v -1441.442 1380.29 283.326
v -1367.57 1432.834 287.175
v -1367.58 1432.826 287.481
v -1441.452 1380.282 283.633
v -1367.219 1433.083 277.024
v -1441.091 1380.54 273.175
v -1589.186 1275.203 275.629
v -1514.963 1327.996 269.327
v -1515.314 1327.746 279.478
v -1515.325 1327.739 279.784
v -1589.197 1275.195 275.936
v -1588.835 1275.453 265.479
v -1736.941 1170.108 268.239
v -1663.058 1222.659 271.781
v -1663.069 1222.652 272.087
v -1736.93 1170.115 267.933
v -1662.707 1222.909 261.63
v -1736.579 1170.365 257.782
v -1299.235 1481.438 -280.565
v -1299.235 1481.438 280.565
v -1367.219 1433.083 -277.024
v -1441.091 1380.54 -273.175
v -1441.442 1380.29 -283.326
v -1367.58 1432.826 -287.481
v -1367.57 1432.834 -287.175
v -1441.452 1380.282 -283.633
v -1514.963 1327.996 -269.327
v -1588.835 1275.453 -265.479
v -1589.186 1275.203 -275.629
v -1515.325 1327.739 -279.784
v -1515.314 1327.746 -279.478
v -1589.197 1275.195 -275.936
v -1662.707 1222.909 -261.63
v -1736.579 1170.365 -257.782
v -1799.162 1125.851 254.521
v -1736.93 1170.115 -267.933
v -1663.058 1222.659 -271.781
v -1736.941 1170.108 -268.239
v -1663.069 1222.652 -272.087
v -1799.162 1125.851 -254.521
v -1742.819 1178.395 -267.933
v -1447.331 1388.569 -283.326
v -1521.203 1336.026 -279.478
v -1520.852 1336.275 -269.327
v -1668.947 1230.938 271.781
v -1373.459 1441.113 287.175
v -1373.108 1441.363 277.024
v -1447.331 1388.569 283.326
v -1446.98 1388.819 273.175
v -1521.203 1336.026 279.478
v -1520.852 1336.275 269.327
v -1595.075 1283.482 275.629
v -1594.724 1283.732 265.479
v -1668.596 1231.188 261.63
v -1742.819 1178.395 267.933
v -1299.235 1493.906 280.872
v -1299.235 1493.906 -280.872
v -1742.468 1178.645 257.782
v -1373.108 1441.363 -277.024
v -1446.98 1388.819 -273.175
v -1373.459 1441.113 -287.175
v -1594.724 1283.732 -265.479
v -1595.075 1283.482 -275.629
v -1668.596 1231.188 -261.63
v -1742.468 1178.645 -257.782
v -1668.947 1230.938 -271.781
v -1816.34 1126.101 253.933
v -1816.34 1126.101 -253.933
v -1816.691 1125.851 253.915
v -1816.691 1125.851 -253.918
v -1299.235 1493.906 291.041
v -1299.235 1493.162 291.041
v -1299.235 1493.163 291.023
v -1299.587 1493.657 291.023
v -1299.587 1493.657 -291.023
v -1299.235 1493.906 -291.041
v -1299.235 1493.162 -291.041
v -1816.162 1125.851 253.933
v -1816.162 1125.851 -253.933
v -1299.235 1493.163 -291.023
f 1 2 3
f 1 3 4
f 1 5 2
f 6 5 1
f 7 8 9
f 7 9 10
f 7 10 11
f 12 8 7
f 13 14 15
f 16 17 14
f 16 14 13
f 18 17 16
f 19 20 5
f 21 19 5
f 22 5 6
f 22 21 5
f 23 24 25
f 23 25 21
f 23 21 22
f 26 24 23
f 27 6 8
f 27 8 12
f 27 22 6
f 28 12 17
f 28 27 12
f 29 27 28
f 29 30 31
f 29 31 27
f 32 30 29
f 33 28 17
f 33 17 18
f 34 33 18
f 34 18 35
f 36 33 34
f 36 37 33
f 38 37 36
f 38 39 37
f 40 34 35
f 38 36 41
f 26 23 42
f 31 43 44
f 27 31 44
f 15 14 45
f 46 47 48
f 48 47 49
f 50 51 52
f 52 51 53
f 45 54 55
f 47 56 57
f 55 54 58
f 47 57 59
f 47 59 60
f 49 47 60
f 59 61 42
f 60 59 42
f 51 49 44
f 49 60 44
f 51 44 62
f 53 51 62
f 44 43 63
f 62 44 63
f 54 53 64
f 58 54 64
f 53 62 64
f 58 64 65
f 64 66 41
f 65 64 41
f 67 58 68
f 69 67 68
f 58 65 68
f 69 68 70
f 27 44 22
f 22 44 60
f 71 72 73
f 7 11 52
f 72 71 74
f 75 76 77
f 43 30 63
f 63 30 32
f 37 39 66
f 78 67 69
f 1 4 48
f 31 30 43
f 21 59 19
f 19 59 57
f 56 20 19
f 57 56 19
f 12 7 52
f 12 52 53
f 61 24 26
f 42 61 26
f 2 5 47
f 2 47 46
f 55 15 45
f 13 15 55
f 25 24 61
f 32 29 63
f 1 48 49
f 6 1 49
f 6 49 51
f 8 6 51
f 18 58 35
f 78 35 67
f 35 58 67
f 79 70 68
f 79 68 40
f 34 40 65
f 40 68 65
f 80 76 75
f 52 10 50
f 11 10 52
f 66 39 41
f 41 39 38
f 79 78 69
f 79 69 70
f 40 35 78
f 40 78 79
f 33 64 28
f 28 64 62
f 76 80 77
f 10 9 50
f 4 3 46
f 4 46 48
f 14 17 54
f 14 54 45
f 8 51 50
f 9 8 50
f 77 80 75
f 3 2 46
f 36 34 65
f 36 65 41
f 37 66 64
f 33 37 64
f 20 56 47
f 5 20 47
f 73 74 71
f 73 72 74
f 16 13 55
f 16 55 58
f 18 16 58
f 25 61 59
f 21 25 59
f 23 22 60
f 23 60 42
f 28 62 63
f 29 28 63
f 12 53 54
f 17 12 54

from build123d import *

# Parameters (mm, degrees)
CUT_EXTRUDE1_DEPTH = 878.515019104


with BuildPart() as part:
    # Boss-Extrude1: read off the stored shape, not the designer's step
    # Boss-Extrude1: loft between two sections, ruled curve by curve
    boss_extrude1_from = [
        Edge.make_line((-1299.235479685, 1493.906364056, 291.041413739), (-1816.691112906, 1125.851113248, 264.08415862)),
        Edge.make_line((-1816.691112906, 1125.851113248, 264.08415862), (-1816.691112906, 1125.851113248, -264.08415862)),
        Edge.make_line((-1299.235479685, 1493.906364056, 291.041413739), (-1299.235479685, 1493.906364056, -291.041413739)),
        Edge.make_line((-1299.235479685, 1493.906364056, -291.041413739), (-1816.691112906, 1125.851113248, -264.08415862)),
    ]
    boss_extrude1_to = [
        Edge.make_line((-1299.235479685, 1481.438435241, 291.041413739), (-1799.16222292, 1125.851113248, 264.997339826)),
        Edge.make_line((-1799.16222292, 1125.851113248, 264.997339826), (-1799.16222292, 1125.851113248, -264.997339826)),
        Edge.make_line((-1299.235479685, 1481.438435241, 291.041413739), (-1299.235479685, 1481.438435241, -291.041413739)),
        Edge.make_line((-1299.235479685, 1481.438435241, -291.041413739), (-1799.16222292, 1125.851113248, -264.997339826)),
    ]
    boss_extrude1 = Solid(Shell([*[Face.make_surface_from_curves(boss_extrude1_from[k], boss_extrude1_to[k]) for k in range(4)], Face(Wire(boss_extrude1_from)), Face(Wire(boss_extrude1_to))]))
    add(boss_extrude1)

    # Sketch2 → Cut-Extrude1 (cut, through all)
    with BuildSketch(Plane(origin=(-1142.087792172, 1605.682191448, 0), x_dir=(0.81489076097809, 0.5796145682024818, 0), z_dir=(-0.5796145682024818, 0.81489076097809, 0))):
        Polygon((-827.845096593, -264.08415862), (-827.414168646, -253.933301459), (-827.845096593, -253.915007546), align=None)
        Polygon((-737.192372014, -267.932581649), (-736.761444067, -257.781724488), (-827.414168646, -253.933301459), (-827.845096593, -264.08415862), align=None)
        Polygon((-555.886922855, -275.629427708), (-555.455994909, -265.478570547), (-646.108719488, -261.630147518), (-646.539647434, -271.781004679), align=None)
        Polygon((-374.581473697, -283.326273767), (-374.150545751, -273.175416606), (-464.80327033, -269.326993577), (-465.234198276, -279.477850738), align=None)
        Polygon((-193.276024539, -291.023119826), (-192.845096593, -280.872262665), (-283.497821172, -277.023839636), (-283.928749118, -287.174696797), align=None)
        Polygon((-192.845096593, -291.041413739), (-192.845096593, -280.872262665), (-193.276024539, -291.023119826), align=None)
        Polygon((-192.845096593, 280.872262665), (-193.276024539, 291.023119826), (-283.928749118, 287.174696797), (-283.497821172, 277.023839636), align=None)
        Polygon((-192.845096593, 280.872262665), (-192.845096593, 291.041413739), (-193.276024539, 291.023119826), align=None)
        Polygon((-374.150545751, 273.175416606), (-374.581473697, 283.326273767), (-465.234198276, 279.477850738), (-464.80327033, 269.326993577), align=None)
        Polygon((-555.455994909, 265.478570547), (-555.886922855, 275.629427708), (-646.539647434, 271.781004679), (-646.108719488, 261.630147518), align=None)
        Polygon((-736.761444067, 257.781724488), (-737.192372014, 267.932581649), (-827.845096593, 264.08415862), (-827.414168646, 253.933301459), align=None)
        Polygon((-827.414168646, 253.933301459), (-827.845096593, 264.08415862), (-827.845096593, 253.917668219), align=None)
        Polygon((-556.826174341, -297.75425795), (-555.886922855, -275.629427708), (-646.539647434, -271.781004679), (-647.47889892, -293.90583492), align=None)
        Polygon((-375.262063911, -299.358128032), (-374.581473697, -283.326273767), (-465.234198276, -279.477850738), (-465.91478849, -295.509705003), align=None)
        Polygon((-194.006069754, -308.219926744), (-193.276024539, -291.023119826), (-283.928749118, -287.174696797), (-284.658794333, -304.371503715), align=None)
        Polygon((-738.000757054, -286.974746688), (-737.192372014, -267.932581649), (-827.845096593, -264.08415862), (-828.653481633, -283.126323658), align=None)
        Polygon((-827.845096593, 264.08415862), (-737.192372014, 267.932581649), (-737.748395542, 281.030166657), (-828.401120121, 277.181743628), align=None)
        Polygon((-646.539647434, 271.781004679), (-555.886922855, 275.629427708), (-556.663676724, 293.926494848), (-647.316401303, 290.078071818), align=None)
        Polygon((-465.234198276, 279.477850738), (-374.581473697, 283.326273767), (-375.05432859, 294.464754124), (-465.707053169, 290.616331094), align=None)
        Polygon((-283.928749118, 287.174696797), (-193.276024539, 291.023119826), (-193.742299233, 302.006598264), (-284.395023812, 298.158175235), align=None)
    extrude(amount=-CUT_EXTRUDE1_DEPTH, mode=Mode.SUBTRACT)


with BuildPart() as cut_extrude1_piece_1:
    # of the separate pieces the step leaves, piece 1, a body of its own (cut_extrude1_pieces)
    add(part.part.solids().sort_by_distance((-1373.458706604, 1441.112952127, 287.174696797))[0])


with BuildPart() as cut_extrude1_piece_2:
    # of the separate pieces the step leaves, piece 2, a body of its own (cut_extrude1_pieces)
    add(part.part.solids().sort_by_distance((-1299.235479685, 1493.906364056, 291.041413739))[0])


with BuildPart() as cut_extrude1_piece_3:
    # of the separate pieces the step leaves, piece 3, a body of its own (cut_extrude1_pieces)
    add(part.part.solids().sort_by_distance((-1299.235479685, 1493.906364056, -291.041413739))[0])


solid = Compound([cut_extrude1_piece_1.part, cut_extrude1_piece_2.part, cut_extrude1_piece_3.part])
